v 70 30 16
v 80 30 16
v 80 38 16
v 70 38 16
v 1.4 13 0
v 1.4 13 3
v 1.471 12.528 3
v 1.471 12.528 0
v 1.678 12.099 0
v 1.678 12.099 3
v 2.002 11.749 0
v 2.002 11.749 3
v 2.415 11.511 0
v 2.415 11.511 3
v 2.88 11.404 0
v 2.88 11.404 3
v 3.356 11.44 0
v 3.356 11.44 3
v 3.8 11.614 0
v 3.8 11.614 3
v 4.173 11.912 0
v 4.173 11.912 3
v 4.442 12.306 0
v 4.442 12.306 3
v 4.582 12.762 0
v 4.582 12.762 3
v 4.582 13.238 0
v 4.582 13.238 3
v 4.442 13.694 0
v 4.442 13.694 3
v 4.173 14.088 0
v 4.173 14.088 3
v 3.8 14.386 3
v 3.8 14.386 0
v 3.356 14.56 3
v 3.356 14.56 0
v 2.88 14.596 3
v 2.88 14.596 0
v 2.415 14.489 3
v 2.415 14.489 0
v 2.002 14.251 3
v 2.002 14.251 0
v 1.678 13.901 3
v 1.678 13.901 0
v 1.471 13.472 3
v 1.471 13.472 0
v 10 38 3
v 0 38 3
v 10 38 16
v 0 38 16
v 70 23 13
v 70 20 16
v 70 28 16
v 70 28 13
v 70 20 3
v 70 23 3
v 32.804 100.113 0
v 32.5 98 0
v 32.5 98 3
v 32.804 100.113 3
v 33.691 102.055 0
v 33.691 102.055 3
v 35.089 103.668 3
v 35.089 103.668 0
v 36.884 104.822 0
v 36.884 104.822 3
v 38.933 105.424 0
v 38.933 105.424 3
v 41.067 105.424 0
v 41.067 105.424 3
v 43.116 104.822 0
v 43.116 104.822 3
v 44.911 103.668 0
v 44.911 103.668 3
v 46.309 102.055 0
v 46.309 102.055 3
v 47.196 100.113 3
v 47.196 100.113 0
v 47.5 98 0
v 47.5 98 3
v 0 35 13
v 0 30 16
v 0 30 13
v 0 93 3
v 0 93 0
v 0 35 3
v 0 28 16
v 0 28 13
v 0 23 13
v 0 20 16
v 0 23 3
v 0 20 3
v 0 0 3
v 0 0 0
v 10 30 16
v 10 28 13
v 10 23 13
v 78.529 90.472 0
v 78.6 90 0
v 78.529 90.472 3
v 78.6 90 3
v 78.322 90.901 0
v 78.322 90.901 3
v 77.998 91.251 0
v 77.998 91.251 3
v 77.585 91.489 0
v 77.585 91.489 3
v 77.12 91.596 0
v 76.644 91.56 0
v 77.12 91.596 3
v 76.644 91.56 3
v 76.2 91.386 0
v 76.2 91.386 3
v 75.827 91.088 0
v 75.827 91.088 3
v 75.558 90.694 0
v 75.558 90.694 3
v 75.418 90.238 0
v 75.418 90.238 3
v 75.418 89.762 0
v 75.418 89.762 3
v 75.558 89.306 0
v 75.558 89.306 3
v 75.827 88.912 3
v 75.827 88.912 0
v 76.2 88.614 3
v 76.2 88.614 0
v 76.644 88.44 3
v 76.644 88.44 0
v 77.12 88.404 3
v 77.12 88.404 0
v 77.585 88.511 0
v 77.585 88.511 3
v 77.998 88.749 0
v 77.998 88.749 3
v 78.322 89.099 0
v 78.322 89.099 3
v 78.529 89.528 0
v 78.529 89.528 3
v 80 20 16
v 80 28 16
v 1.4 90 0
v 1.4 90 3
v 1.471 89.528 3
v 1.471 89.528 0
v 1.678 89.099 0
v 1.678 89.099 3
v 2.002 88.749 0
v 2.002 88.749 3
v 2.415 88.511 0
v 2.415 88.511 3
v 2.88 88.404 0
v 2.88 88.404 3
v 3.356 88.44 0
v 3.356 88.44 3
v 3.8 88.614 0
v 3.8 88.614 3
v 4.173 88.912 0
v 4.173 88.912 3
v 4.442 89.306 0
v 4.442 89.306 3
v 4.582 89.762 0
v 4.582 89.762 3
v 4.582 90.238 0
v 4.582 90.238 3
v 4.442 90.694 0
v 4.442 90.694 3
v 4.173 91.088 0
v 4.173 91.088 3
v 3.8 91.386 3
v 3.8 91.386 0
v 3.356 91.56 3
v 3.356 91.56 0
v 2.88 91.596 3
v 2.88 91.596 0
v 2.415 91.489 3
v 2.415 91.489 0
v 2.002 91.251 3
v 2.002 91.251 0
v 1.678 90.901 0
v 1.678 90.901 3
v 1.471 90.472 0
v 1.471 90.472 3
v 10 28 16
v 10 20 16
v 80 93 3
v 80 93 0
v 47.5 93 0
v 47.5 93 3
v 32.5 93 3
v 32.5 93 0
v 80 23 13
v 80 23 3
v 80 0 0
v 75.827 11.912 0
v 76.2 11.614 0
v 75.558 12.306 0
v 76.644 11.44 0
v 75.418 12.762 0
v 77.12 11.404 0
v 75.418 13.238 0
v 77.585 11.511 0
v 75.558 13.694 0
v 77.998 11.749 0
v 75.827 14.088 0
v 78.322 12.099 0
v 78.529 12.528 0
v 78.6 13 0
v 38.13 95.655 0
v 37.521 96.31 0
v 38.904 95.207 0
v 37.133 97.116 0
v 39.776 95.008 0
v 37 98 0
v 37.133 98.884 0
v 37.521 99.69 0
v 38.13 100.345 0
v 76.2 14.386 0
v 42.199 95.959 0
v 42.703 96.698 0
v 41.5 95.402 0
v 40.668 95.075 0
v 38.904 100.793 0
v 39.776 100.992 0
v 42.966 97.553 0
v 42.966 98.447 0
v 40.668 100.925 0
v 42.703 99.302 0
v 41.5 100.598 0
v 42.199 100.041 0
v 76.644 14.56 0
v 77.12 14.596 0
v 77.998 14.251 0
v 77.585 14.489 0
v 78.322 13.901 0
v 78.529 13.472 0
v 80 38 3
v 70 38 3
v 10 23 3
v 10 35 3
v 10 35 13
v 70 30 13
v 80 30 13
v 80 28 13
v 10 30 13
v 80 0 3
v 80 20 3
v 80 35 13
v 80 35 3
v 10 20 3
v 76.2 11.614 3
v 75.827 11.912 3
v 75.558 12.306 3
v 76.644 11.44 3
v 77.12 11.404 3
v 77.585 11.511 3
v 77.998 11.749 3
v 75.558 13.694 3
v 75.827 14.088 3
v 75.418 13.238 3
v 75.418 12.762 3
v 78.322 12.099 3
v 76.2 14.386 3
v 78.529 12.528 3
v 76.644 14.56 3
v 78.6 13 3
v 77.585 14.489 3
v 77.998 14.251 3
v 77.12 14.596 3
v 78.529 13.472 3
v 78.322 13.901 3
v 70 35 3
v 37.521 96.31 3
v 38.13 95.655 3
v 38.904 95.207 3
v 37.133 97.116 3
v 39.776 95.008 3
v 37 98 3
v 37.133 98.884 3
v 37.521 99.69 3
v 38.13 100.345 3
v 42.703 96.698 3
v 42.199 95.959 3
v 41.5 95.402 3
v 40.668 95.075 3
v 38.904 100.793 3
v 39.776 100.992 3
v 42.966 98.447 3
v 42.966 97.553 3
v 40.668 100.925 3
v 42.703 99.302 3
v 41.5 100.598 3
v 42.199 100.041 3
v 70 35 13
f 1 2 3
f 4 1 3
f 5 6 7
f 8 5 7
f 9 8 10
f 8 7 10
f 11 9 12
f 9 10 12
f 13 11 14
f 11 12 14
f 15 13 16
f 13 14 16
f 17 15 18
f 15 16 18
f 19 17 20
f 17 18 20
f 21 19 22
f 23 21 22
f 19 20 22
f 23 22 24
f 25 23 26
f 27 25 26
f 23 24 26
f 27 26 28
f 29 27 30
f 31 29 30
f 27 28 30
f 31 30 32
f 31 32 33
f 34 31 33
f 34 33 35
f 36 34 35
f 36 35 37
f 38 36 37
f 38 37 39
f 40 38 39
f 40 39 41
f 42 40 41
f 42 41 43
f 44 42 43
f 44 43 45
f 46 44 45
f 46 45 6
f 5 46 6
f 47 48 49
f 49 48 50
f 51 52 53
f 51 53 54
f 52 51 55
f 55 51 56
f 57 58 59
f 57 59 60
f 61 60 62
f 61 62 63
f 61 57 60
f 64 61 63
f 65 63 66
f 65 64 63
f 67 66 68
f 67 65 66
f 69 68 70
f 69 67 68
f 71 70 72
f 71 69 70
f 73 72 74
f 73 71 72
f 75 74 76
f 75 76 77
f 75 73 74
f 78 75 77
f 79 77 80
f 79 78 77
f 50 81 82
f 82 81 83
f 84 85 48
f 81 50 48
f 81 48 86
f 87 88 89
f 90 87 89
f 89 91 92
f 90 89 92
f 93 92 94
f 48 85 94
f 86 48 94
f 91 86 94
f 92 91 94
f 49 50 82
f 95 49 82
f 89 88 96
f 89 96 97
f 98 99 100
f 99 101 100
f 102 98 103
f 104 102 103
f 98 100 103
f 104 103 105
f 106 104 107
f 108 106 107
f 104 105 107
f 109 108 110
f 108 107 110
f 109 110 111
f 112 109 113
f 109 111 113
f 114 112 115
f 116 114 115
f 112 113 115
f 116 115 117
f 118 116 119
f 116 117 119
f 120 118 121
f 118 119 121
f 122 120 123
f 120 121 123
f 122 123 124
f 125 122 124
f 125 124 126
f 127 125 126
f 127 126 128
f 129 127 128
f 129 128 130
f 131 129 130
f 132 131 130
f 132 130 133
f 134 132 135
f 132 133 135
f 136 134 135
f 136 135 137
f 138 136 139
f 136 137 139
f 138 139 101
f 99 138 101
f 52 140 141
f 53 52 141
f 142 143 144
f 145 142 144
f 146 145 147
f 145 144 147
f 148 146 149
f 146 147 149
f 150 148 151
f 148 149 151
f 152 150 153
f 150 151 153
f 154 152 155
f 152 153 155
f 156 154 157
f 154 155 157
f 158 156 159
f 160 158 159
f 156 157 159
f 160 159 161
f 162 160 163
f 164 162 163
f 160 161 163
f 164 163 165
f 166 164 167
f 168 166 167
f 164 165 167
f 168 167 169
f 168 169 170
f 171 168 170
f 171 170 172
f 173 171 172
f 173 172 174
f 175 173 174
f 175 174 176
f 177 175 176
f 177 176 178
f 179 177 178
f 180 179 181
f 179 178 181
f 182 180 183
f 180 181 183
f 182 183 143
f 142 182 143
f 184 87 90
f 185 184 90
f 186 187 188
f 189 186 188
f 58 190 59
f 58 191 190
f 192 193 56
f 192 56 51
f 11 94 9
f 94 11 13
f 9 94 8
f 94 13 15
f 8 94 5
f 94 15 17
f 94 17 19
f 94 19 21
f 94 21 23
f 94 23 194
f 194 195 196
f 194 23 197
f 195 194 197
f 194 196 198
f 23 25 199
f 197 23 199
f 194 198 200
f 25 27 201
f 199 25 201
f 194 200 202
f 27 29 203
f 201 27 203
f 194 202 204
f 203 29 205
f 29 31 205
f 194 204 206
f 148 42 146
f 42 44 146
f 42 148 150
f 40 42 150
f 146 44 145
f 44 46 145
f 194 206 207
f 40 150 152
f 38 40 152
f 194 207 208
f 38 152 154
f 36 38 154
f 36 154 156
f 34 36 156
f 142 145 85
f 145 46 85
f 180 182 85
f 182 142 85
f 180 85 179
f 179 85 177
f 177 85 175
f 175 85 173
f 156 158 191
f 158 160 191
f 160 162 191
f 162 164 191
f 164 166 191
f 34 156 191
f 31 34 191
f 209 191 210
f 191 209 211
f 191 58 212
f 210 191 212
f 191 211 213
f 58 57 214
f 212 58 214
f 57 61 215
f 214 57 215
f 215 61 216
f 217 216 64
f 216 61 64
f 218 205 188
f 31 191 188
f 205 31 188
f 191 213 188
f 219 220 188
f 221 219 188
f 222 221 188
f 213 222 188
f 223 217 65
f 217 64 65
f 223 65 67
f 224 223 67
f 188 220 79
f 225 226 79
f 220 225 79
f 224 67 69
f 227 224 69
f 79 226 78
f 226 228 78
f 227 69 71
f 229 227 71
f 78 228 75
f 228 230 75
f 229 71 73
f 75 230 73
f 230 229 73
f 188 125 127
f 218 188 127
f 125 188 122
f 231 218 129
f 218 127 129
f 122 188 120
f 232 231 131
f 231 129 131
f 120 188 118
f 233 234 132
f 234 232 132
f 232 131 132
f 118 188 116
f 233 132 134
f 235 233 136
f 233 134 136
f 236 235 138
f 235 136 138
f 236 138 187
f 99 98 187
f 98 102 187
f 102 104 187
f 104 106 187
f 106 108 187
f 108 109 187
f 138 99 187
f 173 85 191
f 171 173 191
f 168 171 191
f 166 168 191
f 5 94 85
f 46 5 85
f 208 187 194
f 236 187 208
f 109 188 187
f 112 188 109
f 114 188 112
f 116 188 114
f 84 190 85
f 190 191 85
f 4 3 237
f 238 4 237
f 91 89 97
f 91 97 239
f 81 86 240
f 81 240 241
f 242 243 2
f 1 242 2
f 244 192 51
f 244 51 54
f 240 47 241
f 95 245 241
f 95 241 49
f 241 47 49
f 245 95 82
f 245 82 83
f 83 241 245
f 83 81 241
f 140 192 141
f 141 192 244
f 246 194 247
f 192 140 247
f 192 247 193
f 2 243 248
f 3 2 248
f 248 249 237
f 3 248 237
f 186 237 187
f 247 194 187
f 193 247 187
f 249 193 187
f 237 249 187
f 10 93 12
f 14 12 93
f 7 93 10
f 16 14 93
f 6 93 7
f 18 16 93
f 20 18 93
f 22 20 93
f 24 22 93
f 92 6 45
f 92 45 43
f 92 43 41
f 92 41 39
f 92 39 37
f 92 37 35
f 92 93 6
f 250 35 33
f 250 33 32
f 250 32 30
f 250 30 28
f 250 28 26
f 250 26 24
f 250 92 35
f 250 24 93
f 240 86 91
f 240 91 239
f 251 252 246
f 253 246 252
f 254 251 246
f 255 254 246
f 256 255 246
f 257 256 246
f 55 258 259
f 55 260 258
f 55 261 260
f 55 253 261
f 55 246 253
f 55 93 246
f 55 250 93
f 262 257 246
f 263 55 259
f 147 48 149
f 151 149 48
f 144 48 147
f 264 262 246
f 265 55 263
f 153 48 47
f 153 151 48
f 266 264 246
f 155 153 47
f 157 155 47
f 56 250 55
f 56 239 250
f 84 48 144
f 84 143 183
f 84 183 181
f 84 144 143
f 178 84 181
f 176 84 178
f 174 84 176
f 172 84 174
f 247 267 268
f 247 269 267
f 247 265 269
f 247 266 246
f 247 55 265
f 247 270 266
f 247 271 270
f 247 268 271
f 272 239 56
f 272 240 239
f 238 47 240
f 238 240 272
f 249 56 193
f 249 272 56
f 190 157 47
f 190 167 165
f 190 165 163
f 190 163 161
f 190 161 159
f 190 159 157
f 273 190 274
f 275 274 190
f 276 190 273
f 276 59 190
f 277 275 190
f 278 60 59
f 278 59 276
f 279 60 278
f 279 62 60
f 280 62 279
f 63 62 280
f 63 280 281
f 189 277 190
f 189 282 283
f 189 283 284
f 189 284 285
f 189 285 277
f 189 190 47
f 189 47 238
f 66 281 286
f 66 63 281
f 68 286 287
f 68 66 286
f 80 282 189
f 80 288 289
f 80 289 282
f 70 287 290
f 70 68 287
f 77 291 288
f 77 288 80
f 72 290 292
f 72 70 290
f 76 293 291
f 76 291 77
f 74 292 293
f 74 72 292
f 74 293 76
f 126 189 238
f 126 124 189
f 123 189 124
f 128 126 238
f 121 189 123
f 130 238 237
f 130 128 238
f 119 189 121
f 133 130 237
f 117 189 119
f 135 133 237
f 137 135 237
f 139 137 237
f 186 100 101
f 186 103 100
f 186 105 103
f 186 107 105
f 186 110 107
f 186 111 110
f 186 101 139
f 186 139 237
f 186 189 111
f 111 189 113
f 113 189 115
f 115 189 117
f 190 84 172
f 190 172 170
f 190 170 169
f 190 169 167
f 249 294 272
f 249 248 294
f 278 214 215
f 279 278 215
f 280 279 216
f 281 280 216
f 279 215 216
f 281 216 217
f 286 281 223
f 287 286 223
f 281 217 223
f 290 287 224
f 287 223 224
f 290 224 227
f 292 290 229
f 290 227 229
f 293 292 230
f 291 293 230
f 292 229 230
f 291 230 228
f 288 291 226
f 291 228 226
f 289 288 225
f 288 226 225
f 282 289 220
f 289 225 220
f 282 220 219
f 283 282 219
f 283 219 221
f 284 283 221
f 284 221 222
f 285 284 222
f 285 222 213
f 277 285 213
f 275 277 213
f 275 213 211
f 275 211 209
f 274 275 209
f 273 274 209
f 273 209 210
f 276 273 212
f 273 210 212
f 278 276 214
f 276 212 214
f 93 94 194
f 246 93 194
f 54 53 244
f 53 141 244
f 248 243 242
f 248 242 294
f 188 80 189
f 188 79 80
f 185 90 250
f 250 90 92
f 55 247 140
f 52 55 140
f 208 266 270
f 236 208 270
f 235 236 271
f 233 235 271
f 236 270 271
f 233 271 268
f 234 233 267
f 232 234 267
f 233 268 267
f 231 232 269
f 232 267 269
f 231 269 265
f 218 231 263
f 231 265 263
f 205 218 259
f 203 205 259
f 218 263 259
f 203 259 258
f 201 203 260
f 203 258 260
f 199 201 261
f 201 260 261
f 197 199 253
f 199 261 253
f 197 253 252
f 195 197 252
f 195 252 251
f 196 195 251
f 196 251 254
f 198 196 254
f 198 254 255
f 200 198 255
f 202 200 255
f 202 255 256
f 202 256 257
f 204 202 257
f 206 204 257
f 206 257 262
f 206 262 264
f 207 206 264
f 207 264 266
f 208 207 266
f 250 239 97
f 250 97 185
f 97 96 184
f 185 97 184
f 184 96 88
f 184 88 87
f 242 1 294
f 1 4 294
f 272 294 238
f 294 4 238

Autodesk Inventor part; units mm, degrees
ref_plane "YZ Plane" through (0, 0, 0) normal (1, 0, 0) x (0, 1, 0)
ref_plane "XZ Plane" through (0, 0, 0) normal (0, 1, 0) x (-1, 0, 0)
ref_plane "XY Plane" through (0, 0, 0) normal (0, 0, 1) x (1, 0, 0)
sketch "Sketch1" plane through (0, 0, 0) normal (0, 0, 1) x (1, 0, 0)
  line L0 (0, 0) -> (80, 0)
  line L1 (80, 0) -> (80, 93)
  line L2 (80, 93) -> (0, 93)
  line L3 (0, 93) -> (0, 0)
  dimension "d0" = 80
  dimension "d1" = 93
extrude "Extrusion1" add sketch "Sketch1" along normal blind 3
sketch "Sketch3" plane through (80, 0, 0) normal (1, 0, 0) x (0, 0, -1)
  line L0 (-3, 0) -> (-3, 93) construction
  line L1 (-3, 20) -> (-16, 20)
  line L2 (-16, 38) -> (-3, 38)
  line L3 (-3, 38) -> (-3, 20) construction
  line L4 (-3, 23) -> (-13, 23)
  line L5 (-13, 35) -> (-3, 35)
  line L6 (0, 0) -> (-3, 0) projected
  line L7 (-16, 28) -> (-13, 28)
  line L8 (-13, 30) -> (-16, 30)
  line L9 (-16, 20) -> (-16, 28)
  line L10 (-16, 30) -> (-16, 38)
  line L11 (-13, 23) -> (-13, 28)
  line L12 (-13, 30) -> (-13, 35)
  line L13 (-3, 38) -> (-3, 35)
  line L14 (-3, 20) -> (-3, 23)
  point P0 (-13, 19)
  point P1 (-16, 19)
  dimension "d4" = 3
  dimension "d6" = 20
  dimension "d7" = 12
  dimension "d8" = 10
  dimension "d9" = 3
  dimension "d10" = 5
  dimension "d11" = 5
  dimension "d12" = 3
ref_plane "Work Plane1" through (40, 0, 0) normal (1, 0, 0) x (0, 0, -1)
extrude "Extrusion2" add sketch "Sketch3" against normal blind 10
mirror "Mirror1" about plane through (40, 0, 0) normal (1, 0, 0) of "Extrusion2"
sketch "Sketch4" plane through (0, 0, 3) normal (0, 0, 1) x (1, 0, 0)
  circle A0 centre (77, 13) radius 1.6
  line L0 (80, 0) -> (80, 20) projected
  line L1 (0, 0) -> (80, 0) projected
  circle A1 centre (77, 90) radius 1.6
  line L2 (80, 93) -> (0, 93) projected
  dimension "d15" = 3.2
  dimension "d16" = 3
  dimension "d17" = 13
  dimension "d18" = 3
extrude "Extrusion3" cut sketch "Sketch4" against normal through all
mirror "Mirror2" about plane through (40, 0, 0) normal (1, 0, 0) of "Extrusion2", "Extrusion3"
sketch "Sketch5" plane through (0, 0, 0) normal (0, 0, -1) x (-1, 0, 0)
  line L0 (-80, 93) -> (0, 93) construction
  line L1 (-47.5, 93) -> (-32.5, 93)
  line L2 (-32.5, 93) -> (-32.5, 98)
  line L3 (-32.5, 98) -> (-47.5, 98) construction
  line L4 (-47.5, 98) -> (-47.5, 93)
  arc A0 (-32.5, 98) -> (-47.5, 98) centre (-40, 98) ccw
  circle A1 centre (-40, 98) radius 3
  point P0 (0, 0)
  point P1 (-40, 93)
  point P2 (-40, 93)
  dimension "d21" = 6
  dimension "d22" = 15
  dimension "d23" = 5
extrude "Extrusion4" add sketch "Sketch5" against normal blind 3
equation "\"d11\" = d10"
equation "\"d12\" = d4"
equation "\"d18\" = d16"
equation "\"d5\" = d4"
properties part number "Wheel Base"
